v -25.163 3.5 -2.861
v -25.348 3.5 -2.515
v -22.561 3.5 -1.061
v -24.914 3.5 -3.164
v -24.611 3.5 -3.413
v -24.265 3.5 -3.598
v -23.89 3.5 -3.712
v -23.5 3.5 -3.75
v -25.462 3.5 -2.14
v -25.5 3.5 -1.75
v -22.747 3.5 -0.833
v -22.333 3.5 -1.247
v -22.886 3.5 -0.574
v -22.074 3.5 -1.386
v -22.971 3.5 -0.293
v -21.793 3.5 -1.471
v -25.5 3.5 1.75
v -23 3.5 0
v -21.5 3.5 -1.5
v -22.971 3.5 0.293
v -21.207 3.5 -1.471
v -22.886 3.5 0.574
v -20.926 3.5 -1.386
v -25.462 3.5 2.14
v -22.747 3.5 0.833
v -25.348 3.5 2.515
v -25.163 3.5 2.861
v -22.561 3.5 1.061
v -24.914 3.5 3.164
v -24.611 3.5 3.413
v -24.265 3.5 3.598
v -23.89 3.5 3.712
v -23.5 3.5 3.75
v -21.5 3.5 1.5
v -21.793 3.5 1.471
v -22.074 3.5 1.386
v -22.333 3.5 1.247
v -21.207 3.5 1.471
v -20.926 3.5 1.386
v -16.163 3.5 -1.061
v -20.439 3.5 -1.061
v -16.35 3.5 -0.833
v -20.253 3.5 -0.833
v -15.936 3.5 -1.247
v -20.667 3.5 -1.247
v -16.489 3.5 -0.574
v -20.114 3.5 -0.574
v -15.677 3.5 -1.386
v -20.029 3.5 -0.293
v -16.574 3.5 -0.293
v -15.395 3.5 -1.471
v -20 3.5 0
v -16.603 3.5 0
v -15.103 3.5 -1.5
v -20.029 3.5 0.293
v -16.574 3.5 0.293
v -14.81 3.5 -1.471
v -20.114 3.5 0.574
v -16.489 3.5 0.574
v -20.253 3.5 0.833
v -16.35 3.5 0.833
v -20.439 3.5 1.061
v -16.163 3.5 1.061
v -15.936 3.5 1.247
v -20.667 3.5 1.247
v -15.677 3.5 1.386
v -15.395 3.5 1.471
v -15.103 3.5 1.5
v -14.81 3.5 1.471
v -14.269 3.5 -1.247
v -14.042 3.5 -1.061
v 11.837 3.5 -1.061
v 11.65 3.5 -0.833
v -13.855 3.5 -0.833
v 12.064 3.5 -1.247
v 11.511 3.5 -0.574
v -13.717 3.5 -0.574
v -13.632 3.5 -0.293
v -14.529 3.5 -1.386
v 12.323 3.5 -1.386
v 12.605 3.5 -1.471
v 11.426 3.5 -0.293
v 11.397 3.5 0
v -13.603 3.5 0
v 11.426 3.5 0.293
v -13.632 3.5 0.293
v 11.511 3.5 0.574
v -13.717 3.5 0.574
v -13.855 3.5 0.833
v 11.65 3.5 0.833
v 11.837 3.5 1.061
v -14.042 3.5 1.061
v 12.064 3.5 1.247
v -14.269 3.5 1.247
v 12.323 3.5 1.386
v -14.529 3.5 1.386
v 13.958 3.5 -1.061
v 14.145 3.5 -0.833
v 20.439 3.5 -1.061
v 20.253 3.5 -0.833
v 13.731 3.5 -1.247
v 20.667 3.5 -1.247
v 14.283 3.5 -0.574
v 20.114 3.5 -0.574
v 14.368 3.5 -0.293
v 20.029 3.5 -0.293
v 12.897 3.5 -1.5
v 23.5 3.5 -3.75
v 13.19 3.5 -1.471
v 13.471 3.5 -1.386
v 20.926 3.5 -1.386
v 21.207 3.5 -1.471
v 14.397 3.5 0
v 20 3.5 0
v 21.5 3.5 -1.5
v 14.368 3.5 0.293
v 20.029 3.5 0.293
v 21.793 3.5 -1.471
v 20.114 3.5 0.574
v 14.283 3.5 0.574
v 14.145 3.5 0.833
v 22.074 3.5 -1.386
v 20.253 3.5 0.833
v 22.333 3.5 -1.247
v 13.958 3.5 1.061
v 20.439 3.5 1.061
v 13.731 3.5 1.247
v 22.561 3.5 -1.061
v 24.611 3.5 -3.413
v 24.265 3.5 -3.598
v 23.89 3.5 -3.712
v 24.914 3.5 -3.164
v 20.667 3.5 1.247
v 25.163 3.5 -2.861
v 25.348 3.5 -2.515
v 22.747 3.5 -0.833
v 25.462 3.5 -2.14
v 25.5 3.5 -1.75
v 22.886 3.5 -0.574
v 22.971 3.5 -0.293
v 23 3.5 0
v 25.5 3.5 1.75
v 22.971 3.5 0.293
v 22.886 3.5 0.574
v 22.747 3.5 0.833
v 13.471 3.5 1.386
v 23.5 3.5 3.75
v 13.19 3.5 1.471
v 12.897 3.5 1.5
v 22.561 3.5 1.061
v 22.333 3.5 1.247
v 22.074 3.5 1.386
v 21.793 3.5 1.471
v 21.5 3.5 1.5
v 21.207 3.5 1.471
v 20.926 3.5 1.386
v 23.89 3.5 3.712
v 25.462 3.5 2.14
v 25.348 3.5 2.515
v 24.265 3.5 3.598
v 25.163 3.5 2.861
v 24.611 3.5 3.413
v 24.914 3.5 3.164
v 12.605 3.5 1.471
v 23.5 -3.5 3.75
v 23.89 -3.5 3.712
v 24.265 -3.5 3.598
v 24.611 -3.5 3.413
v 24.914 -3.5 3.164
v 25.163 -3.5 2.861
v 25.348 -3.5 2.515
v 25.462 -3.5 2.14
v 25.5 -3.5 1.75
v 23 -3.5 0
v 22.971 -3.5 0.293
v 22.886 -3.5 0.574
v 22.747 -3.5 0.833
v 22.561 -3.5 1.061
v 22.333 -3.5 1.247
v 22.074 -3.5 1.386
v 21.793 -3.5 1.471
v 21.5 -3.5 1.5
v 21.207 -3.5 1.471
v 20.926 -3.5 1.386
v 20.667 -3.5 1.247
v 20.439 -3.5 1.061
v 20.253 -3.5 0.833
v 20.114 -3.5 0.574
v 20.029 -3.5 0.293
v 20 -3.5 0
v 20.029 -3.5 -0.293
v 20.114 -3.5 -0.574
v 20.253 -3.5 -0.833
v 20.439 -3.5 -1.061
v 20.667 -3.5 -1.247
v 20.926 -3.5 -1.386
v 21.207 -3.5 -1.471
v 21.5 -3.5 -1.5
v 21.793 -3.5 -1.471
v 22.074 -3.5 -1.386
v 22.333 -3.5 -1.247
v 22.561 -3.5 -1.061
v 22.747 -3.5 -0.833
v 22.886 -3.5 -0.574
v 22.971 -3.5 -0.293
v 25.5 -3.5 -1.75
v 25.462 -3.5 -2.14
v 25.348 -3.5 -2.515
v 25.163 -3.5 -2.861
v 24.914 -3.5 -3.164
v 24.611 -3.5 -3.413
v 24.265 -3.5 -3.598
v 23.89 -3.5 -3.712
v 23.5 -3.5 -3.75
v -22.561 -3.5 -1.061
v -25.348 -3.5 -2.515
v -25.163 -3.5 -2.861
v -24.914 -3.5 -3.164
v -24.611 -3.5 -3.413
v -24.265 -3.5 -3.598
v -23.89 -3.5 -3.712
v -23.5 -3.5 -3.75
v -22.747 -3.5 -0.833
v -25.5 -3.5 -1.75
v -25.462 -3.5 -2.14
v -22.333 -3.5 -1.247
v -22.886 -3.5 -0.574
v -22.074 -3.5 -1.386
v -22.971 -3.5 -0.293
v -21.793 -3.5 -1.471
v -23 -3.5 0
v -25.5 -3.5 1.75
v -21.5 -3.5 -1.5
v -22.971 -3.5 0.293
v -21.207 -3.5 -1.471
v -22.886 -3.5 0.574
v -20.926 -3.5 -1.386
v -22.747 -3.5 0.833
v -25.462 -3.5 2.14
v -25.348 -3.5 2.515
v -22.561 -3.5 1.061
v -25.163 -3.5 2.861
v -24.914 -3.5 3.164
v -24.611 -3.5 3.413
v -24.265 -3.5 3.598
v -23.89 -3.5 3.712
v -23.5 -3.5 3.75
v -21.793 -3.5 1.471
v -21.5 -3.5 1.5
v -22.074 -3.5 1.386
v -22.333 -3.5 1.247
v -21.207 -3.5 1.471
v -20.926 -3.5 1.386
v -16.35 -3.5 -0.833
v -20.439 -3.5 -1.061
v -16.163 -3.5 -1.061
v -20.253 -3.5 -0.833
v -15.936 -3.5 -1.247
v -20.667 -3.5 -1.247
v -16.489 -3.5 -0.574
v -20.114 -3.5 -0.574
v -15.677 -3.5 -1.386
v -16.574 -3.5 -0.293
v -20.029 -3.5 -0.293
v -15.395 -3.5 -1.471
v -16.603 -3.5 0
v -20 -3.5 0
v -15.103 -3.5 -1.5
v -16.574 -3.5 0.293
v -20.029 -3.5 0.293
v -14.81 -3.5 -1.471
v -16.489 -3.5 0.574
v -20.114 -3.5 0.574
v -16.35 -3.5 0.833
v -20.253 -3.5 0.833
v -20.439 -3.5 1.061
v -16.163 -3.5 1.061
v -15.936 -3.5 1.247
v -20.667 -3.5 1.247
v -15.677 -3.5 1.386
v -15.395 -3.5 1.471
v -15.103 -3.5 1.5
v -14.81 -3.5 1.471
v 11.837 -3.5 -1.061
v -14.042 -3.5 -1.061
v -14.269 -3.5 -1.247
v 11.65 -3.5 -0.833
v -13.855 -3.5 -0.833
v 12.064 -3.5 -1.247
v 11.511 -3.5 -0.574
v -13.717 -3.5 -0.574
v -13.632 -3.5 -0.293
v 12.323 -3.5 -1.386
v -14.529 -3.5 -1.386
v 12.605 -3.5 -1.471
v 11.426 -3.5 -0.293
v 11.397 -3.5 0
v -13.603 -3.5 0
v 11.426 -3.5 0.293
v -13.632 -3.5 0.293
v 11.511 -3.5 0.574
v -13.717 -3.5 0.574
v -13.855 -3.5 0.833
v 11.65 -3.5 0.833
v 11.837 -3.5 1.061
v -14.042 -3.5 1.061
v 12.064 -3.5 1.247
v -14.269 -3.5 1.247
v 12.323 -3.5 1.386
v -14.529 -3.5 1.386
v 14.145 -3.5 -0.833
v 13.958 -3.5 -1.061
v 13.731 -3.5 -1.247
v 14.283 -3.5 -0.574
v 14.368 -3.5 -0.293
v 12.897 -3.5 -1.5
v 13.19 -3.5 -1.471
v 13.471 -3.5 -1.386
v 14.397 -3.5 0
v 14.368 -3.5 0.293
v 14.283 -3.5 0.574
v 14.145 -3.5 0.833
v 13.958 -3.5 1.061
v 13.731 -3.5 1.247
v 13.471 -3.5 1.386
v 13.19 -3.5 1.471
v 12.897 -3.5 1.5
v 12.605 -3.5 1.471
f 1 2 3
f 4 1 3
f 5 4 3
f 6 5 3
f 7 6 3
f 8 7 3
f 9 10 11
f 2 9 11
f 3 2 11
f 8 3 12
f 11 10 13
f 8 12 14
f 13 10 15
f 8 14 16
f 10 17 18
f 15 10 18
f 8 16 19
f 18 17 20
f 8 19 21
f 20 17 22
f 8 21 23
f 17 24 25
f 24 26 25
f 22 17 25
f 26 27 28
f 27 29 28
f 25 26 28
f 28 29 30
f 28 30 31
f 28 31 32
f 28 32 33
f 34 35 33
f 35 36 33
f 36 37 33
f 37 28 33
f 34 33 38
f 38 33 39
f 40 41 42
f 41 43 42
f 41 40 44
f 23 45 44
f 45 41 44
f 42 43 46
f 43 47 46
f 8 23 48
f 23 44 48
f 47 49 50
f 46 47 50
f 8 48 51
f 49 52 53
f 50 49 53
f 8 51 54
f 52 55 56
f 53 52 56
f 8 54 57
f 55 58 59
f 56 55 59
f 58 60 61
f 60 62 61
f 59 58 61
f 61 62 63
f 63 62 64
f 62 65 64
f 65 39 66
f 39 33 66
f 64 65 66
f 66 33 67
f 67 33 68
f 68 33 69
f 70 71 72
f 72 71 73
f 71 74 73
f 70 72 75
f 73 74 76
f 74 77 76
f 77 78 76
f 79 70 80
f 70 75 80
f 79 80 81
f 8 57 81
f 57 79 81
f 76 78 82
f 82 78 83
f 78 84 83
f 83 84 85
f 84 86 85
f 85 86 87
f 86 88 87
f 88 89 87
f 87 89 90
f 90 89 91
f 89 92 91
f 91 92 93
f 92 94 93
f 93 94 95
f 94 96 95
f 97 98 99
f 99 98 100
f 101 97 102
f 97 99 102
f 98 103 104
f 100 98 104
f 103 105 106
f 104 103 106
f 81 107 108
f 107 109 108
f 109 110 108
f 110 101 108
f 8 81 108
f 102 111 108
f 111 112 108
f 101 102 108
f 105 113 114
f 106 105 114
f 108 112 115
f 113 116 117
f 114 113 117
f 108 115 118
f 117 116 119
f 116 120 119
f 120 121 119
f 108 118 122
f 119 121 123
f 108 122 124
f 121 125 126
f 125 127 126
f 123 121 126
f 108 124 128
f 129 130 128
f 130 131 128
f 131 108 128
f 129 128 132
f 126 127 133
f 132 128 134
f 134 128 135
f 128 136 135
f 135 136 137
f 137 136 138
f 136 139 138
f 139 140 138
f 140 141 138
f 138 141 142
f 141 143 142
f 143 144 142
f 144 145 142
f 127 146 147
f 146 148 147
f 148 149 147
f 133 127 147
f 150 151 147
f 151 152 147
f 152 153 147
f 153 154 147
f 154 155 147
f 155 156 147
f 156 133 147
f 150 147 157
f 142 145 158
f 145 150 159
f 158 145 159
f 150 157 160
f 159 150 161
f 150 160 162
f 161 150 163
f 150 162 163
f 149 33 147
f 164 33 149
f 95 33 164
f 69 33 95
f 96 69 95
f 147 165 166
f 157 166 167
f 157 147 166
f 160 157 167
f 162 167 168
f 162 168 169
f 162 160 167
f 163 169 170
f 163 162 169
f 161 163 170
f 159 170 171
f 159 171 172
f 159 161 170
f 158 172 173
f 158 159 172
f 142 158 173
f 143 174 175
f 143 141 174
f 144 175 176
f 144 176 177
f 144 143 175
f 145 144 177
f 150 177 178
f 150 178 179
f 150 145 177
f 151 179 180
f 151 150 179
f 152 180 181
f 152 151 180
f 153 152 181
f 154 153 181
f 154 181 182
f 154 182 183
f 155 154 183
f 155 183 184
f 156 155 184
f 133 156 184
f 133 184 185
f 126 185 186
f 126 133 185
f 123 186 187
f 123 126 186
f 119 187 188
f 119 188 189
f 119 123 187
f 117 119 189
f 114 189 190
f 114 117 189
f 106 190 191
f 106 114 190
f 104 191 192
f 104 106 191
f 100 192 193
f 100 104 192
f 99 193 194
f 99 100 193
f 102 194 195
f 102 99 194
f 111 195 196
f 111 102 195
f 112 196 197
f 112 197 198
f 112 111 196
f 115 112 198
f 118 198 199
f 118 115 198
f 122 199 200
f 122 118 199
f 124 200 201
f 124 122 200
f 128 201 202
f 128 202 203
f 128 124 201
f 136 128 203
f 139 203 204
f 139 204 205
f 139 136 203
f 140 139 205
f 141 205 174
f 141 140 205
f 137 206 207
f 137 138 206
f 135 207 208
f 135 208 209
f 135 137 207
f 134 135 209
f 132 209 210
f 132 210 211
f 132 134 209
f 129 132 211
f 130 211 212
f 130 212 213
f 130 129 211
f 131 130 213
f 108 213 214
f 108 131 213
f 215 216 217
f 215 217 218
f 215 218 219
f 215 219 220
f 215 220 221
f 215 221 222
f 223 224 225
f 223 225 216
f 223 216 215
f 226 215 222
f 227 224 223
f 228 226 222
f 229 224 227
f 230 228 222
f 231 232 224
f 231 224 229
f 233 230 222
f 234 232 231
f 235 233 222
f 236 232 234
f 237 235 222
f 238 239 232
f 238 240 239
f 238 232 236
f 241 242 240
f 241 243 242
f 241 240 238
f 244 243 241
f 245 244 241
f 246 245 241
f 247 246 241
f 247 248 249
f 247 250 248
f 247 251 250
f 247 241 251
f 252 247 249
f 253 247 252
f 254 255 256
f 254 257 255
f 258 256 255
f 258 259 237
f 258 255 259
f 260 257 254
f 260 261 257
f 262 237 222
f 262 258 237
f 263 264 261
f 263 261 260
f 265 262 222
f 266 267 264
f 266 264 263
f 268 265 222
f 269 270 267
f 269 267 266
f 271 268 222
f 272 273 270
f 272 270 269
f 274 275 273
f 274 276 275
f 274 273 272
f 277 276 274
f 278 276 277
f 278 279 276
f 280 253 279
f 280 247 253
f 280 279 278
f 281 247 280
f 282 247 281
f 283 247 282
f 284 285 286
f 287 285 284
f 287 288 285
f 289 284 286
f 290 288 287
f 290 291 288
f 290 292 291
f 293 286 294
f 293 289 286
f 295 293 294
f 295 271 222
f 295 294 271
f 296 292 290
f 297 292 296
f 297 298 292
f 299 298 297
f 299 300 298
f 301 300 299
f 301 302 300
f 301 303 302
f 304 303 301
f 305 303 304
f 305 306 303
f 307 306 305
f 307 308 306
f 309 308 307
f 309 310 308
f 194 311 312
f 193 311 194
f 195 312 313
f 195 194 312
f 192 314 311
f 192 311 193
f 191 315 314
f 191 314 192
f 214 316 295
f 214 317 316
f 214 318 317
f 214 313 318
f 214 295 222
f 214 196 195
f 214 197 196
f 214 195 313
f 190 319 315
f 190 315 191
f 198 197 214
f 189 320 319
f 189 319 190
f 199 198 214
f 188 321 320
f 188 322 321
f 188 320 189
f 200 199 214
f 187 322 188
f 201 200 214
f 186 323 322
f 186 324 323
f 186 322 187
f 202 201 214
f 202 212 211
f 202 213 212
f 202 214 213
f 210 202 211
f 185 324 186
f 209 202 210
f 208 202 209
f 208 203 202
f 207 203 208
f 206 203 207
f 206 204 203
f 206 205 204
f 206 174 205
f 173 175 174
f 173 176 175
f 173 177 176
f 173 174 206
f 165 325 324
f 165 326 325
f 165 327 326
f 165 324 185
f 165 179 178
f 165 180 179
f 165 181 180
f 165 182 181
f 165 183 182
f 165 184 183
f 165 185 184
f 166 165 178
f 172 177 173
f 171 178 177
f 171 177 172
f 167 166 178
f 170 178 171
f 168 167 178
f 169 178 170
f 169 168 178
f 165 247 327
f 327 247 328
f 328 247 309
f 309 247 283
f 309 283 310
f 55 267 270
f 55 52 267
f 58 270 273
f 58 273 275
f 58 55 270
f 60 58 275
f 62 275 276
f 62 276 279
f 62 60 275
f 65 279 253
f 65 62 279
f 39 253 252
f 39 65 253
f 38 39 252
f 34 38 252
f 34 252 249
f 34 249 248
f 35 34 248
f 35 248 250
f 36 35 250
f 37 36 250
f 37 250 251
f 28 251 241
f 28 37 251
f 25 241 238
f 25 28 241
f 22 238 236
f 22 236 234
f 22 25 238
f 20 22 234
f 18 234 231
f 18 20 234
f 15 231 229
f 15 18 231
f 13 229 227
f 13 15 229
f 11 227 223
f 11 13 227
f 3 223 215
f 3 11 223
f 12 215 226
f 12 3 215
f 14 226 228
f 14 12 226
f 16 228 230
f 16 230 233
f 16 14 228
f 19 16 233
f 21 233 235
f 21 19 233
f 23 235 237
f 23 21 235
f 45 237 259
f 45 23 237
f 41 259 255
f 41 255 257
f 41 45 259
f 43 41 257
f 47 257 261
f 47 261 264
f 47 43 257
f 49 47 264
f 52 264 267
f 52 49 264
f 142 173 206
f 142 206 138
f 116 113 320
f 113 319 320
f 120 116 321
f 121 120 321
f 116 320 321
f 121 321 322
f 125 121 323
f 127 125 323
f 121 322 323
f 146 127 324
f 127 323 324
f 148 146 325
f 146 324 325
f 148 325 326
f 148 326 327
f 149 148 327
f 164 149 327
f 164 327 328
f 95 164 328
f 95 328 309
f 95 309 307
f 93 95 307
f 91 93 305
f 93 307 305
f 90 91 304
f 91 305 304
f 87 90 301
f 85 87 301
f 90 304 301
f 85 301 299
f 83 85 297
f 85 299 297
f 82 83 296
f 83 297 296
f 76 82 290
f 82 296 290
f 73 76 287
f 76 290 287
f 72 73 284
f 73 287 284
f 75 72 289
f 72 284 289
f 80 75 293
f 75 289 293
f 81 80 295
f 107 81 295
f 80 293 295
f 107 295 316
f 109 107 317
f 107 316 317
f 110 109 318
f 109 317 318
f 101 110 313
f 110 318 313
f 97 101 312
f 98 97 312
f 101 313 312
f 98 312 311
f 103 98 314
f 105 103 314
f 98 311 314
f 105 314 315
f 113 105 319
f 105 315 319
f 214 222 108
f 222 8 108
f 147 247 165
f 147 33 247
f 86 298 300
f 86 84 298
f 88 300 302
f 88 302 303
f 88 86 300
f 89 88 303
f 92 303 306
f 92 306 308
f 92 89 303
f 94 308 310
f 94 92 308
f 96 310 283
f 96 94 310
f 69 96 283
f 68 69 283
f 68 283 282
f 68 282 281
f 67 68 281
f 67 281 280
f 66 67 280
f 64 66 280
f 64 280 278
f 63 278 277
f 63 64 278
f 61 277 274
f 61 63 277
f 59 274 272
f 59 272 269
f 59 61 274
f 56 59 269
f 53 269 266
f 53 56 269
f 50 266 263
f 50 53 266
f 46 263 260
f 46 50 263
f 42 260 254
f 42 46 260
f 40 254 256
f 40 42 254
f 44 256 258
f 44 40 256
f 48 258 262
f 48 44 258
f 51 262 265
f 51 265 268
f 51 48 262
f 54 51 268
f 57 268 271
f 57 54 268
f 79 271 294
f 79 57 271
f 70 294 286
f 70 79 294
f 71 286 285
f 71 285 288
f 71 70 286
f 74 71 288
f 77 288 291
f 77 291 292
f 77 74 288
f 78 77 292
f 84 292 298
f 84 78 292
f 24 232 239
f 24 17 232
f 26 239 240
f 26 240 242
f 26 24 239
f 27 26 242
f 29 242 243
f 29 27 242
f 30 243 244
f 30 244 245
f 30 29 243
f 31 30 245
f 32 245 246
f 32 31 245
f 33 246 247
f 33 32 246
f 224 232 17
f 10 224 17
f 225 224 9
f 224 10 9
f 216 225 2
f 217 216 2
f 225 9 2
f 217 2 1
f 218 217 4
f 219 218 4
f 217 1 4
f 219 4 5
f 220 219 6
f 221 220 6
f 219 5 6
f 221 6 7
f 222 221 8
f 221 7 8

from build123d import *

# Parameters (mm, degrees)
F0_W     = 51
F0_H     = 7
F1_DEPTH = 3.75
F2_R     = 2
F3_R     = 2
F4_R     = 2
F5_R     = 2
F6_R     = 1.5
F7_DEPTH = 3.5
F8_R     = 1.5
F9_DEPTH = 3.5


with BuildPart() as f1:
    # F0 (on Top) → F1 (new body, symmetric)
    with BuildSketch(Plane.XY):
        Rectangle(F0_W, F0_H)
    extrude(amount=F1_DEPTH, both=True)

    # F2
    f2_edges = [f1.edges().sort_by_distance(p)[0] for p in [
        (-25.5, 0, 3.75),
    ]]
    fillet(f2_edges, radius=F2_R)

    # F3
    f3_edges = [f1.edges().sort_by_distance(p)[0] for p in [
        (-25.5, 0, -3.75),
    ]]
    fillet(f3_edges, radius=F3_R)

    # F4
    f4_edges = [f1.edges().sort_by_distance(p)[0] for p in [
        (25.5, 0, 3.75),
    ]]
    fillet(f4_edges, radius=F4_R)

    # F5
    f5_edges = [f1.edges().sort_by_distance(p)[0] for p in [
        (25.5, 0, -3.75),
    ]]
    fillet(f5_edges, radius=F5_R)

    # F6 (on Front) → F7 (intersect, symmetric)
    with BuildSketch(Plane.XZ):
        with BuildLine():
            ThreePointArc((-25.5, -1.75), (-24.9142135624, -3.1642135624), (-23.5, -3.75))
            Line((-23.5, -3.75), (23.5, -3.75))
            ThreePointArc((23.5, -3.75), (24.9142135624, -3.1642135624), (25.5, -1.75))
            Line((25.5, -1.75), (25.5, 1.75))
            ThreePointArc((25.5, 1.75), (24.9142135624, 3.1642135624), (23.5, 3.75))
            Line((23.5, 3.75), (-23.5, 3.75))
            ThreePointArc((-23.5, 3.75), (-24.9142135624, 3.1642135624), (-25.5, 1.75))
            Line((-25.5, 1.75), (-25.5, -1.75))
        make_face()
        with Locations((-21.5, 0)):
            Circle(F6_R, mode=Mode.SUBTRACT)
        with Locations((21.5, 0)):
            Circle(F6_R, mode=Mode.SUBTRACT)
    extrude(amount=F7_DEPTH, both=True, mode=Mode.INTERSECT)

    # F8 (on Front) → F9 (cut, symmetric)
    with BuildSketch(Plane.XZ):
        with Locations((-15.1026989078, 0)):
            Circle(F8_R)
        with Locations((12.8973010922, 0)):
            Circle(F8_R)
    extrude(amount=F9_DEPTH, both=True, mode=Mode.SUBTRACT)


solid = f1.part
